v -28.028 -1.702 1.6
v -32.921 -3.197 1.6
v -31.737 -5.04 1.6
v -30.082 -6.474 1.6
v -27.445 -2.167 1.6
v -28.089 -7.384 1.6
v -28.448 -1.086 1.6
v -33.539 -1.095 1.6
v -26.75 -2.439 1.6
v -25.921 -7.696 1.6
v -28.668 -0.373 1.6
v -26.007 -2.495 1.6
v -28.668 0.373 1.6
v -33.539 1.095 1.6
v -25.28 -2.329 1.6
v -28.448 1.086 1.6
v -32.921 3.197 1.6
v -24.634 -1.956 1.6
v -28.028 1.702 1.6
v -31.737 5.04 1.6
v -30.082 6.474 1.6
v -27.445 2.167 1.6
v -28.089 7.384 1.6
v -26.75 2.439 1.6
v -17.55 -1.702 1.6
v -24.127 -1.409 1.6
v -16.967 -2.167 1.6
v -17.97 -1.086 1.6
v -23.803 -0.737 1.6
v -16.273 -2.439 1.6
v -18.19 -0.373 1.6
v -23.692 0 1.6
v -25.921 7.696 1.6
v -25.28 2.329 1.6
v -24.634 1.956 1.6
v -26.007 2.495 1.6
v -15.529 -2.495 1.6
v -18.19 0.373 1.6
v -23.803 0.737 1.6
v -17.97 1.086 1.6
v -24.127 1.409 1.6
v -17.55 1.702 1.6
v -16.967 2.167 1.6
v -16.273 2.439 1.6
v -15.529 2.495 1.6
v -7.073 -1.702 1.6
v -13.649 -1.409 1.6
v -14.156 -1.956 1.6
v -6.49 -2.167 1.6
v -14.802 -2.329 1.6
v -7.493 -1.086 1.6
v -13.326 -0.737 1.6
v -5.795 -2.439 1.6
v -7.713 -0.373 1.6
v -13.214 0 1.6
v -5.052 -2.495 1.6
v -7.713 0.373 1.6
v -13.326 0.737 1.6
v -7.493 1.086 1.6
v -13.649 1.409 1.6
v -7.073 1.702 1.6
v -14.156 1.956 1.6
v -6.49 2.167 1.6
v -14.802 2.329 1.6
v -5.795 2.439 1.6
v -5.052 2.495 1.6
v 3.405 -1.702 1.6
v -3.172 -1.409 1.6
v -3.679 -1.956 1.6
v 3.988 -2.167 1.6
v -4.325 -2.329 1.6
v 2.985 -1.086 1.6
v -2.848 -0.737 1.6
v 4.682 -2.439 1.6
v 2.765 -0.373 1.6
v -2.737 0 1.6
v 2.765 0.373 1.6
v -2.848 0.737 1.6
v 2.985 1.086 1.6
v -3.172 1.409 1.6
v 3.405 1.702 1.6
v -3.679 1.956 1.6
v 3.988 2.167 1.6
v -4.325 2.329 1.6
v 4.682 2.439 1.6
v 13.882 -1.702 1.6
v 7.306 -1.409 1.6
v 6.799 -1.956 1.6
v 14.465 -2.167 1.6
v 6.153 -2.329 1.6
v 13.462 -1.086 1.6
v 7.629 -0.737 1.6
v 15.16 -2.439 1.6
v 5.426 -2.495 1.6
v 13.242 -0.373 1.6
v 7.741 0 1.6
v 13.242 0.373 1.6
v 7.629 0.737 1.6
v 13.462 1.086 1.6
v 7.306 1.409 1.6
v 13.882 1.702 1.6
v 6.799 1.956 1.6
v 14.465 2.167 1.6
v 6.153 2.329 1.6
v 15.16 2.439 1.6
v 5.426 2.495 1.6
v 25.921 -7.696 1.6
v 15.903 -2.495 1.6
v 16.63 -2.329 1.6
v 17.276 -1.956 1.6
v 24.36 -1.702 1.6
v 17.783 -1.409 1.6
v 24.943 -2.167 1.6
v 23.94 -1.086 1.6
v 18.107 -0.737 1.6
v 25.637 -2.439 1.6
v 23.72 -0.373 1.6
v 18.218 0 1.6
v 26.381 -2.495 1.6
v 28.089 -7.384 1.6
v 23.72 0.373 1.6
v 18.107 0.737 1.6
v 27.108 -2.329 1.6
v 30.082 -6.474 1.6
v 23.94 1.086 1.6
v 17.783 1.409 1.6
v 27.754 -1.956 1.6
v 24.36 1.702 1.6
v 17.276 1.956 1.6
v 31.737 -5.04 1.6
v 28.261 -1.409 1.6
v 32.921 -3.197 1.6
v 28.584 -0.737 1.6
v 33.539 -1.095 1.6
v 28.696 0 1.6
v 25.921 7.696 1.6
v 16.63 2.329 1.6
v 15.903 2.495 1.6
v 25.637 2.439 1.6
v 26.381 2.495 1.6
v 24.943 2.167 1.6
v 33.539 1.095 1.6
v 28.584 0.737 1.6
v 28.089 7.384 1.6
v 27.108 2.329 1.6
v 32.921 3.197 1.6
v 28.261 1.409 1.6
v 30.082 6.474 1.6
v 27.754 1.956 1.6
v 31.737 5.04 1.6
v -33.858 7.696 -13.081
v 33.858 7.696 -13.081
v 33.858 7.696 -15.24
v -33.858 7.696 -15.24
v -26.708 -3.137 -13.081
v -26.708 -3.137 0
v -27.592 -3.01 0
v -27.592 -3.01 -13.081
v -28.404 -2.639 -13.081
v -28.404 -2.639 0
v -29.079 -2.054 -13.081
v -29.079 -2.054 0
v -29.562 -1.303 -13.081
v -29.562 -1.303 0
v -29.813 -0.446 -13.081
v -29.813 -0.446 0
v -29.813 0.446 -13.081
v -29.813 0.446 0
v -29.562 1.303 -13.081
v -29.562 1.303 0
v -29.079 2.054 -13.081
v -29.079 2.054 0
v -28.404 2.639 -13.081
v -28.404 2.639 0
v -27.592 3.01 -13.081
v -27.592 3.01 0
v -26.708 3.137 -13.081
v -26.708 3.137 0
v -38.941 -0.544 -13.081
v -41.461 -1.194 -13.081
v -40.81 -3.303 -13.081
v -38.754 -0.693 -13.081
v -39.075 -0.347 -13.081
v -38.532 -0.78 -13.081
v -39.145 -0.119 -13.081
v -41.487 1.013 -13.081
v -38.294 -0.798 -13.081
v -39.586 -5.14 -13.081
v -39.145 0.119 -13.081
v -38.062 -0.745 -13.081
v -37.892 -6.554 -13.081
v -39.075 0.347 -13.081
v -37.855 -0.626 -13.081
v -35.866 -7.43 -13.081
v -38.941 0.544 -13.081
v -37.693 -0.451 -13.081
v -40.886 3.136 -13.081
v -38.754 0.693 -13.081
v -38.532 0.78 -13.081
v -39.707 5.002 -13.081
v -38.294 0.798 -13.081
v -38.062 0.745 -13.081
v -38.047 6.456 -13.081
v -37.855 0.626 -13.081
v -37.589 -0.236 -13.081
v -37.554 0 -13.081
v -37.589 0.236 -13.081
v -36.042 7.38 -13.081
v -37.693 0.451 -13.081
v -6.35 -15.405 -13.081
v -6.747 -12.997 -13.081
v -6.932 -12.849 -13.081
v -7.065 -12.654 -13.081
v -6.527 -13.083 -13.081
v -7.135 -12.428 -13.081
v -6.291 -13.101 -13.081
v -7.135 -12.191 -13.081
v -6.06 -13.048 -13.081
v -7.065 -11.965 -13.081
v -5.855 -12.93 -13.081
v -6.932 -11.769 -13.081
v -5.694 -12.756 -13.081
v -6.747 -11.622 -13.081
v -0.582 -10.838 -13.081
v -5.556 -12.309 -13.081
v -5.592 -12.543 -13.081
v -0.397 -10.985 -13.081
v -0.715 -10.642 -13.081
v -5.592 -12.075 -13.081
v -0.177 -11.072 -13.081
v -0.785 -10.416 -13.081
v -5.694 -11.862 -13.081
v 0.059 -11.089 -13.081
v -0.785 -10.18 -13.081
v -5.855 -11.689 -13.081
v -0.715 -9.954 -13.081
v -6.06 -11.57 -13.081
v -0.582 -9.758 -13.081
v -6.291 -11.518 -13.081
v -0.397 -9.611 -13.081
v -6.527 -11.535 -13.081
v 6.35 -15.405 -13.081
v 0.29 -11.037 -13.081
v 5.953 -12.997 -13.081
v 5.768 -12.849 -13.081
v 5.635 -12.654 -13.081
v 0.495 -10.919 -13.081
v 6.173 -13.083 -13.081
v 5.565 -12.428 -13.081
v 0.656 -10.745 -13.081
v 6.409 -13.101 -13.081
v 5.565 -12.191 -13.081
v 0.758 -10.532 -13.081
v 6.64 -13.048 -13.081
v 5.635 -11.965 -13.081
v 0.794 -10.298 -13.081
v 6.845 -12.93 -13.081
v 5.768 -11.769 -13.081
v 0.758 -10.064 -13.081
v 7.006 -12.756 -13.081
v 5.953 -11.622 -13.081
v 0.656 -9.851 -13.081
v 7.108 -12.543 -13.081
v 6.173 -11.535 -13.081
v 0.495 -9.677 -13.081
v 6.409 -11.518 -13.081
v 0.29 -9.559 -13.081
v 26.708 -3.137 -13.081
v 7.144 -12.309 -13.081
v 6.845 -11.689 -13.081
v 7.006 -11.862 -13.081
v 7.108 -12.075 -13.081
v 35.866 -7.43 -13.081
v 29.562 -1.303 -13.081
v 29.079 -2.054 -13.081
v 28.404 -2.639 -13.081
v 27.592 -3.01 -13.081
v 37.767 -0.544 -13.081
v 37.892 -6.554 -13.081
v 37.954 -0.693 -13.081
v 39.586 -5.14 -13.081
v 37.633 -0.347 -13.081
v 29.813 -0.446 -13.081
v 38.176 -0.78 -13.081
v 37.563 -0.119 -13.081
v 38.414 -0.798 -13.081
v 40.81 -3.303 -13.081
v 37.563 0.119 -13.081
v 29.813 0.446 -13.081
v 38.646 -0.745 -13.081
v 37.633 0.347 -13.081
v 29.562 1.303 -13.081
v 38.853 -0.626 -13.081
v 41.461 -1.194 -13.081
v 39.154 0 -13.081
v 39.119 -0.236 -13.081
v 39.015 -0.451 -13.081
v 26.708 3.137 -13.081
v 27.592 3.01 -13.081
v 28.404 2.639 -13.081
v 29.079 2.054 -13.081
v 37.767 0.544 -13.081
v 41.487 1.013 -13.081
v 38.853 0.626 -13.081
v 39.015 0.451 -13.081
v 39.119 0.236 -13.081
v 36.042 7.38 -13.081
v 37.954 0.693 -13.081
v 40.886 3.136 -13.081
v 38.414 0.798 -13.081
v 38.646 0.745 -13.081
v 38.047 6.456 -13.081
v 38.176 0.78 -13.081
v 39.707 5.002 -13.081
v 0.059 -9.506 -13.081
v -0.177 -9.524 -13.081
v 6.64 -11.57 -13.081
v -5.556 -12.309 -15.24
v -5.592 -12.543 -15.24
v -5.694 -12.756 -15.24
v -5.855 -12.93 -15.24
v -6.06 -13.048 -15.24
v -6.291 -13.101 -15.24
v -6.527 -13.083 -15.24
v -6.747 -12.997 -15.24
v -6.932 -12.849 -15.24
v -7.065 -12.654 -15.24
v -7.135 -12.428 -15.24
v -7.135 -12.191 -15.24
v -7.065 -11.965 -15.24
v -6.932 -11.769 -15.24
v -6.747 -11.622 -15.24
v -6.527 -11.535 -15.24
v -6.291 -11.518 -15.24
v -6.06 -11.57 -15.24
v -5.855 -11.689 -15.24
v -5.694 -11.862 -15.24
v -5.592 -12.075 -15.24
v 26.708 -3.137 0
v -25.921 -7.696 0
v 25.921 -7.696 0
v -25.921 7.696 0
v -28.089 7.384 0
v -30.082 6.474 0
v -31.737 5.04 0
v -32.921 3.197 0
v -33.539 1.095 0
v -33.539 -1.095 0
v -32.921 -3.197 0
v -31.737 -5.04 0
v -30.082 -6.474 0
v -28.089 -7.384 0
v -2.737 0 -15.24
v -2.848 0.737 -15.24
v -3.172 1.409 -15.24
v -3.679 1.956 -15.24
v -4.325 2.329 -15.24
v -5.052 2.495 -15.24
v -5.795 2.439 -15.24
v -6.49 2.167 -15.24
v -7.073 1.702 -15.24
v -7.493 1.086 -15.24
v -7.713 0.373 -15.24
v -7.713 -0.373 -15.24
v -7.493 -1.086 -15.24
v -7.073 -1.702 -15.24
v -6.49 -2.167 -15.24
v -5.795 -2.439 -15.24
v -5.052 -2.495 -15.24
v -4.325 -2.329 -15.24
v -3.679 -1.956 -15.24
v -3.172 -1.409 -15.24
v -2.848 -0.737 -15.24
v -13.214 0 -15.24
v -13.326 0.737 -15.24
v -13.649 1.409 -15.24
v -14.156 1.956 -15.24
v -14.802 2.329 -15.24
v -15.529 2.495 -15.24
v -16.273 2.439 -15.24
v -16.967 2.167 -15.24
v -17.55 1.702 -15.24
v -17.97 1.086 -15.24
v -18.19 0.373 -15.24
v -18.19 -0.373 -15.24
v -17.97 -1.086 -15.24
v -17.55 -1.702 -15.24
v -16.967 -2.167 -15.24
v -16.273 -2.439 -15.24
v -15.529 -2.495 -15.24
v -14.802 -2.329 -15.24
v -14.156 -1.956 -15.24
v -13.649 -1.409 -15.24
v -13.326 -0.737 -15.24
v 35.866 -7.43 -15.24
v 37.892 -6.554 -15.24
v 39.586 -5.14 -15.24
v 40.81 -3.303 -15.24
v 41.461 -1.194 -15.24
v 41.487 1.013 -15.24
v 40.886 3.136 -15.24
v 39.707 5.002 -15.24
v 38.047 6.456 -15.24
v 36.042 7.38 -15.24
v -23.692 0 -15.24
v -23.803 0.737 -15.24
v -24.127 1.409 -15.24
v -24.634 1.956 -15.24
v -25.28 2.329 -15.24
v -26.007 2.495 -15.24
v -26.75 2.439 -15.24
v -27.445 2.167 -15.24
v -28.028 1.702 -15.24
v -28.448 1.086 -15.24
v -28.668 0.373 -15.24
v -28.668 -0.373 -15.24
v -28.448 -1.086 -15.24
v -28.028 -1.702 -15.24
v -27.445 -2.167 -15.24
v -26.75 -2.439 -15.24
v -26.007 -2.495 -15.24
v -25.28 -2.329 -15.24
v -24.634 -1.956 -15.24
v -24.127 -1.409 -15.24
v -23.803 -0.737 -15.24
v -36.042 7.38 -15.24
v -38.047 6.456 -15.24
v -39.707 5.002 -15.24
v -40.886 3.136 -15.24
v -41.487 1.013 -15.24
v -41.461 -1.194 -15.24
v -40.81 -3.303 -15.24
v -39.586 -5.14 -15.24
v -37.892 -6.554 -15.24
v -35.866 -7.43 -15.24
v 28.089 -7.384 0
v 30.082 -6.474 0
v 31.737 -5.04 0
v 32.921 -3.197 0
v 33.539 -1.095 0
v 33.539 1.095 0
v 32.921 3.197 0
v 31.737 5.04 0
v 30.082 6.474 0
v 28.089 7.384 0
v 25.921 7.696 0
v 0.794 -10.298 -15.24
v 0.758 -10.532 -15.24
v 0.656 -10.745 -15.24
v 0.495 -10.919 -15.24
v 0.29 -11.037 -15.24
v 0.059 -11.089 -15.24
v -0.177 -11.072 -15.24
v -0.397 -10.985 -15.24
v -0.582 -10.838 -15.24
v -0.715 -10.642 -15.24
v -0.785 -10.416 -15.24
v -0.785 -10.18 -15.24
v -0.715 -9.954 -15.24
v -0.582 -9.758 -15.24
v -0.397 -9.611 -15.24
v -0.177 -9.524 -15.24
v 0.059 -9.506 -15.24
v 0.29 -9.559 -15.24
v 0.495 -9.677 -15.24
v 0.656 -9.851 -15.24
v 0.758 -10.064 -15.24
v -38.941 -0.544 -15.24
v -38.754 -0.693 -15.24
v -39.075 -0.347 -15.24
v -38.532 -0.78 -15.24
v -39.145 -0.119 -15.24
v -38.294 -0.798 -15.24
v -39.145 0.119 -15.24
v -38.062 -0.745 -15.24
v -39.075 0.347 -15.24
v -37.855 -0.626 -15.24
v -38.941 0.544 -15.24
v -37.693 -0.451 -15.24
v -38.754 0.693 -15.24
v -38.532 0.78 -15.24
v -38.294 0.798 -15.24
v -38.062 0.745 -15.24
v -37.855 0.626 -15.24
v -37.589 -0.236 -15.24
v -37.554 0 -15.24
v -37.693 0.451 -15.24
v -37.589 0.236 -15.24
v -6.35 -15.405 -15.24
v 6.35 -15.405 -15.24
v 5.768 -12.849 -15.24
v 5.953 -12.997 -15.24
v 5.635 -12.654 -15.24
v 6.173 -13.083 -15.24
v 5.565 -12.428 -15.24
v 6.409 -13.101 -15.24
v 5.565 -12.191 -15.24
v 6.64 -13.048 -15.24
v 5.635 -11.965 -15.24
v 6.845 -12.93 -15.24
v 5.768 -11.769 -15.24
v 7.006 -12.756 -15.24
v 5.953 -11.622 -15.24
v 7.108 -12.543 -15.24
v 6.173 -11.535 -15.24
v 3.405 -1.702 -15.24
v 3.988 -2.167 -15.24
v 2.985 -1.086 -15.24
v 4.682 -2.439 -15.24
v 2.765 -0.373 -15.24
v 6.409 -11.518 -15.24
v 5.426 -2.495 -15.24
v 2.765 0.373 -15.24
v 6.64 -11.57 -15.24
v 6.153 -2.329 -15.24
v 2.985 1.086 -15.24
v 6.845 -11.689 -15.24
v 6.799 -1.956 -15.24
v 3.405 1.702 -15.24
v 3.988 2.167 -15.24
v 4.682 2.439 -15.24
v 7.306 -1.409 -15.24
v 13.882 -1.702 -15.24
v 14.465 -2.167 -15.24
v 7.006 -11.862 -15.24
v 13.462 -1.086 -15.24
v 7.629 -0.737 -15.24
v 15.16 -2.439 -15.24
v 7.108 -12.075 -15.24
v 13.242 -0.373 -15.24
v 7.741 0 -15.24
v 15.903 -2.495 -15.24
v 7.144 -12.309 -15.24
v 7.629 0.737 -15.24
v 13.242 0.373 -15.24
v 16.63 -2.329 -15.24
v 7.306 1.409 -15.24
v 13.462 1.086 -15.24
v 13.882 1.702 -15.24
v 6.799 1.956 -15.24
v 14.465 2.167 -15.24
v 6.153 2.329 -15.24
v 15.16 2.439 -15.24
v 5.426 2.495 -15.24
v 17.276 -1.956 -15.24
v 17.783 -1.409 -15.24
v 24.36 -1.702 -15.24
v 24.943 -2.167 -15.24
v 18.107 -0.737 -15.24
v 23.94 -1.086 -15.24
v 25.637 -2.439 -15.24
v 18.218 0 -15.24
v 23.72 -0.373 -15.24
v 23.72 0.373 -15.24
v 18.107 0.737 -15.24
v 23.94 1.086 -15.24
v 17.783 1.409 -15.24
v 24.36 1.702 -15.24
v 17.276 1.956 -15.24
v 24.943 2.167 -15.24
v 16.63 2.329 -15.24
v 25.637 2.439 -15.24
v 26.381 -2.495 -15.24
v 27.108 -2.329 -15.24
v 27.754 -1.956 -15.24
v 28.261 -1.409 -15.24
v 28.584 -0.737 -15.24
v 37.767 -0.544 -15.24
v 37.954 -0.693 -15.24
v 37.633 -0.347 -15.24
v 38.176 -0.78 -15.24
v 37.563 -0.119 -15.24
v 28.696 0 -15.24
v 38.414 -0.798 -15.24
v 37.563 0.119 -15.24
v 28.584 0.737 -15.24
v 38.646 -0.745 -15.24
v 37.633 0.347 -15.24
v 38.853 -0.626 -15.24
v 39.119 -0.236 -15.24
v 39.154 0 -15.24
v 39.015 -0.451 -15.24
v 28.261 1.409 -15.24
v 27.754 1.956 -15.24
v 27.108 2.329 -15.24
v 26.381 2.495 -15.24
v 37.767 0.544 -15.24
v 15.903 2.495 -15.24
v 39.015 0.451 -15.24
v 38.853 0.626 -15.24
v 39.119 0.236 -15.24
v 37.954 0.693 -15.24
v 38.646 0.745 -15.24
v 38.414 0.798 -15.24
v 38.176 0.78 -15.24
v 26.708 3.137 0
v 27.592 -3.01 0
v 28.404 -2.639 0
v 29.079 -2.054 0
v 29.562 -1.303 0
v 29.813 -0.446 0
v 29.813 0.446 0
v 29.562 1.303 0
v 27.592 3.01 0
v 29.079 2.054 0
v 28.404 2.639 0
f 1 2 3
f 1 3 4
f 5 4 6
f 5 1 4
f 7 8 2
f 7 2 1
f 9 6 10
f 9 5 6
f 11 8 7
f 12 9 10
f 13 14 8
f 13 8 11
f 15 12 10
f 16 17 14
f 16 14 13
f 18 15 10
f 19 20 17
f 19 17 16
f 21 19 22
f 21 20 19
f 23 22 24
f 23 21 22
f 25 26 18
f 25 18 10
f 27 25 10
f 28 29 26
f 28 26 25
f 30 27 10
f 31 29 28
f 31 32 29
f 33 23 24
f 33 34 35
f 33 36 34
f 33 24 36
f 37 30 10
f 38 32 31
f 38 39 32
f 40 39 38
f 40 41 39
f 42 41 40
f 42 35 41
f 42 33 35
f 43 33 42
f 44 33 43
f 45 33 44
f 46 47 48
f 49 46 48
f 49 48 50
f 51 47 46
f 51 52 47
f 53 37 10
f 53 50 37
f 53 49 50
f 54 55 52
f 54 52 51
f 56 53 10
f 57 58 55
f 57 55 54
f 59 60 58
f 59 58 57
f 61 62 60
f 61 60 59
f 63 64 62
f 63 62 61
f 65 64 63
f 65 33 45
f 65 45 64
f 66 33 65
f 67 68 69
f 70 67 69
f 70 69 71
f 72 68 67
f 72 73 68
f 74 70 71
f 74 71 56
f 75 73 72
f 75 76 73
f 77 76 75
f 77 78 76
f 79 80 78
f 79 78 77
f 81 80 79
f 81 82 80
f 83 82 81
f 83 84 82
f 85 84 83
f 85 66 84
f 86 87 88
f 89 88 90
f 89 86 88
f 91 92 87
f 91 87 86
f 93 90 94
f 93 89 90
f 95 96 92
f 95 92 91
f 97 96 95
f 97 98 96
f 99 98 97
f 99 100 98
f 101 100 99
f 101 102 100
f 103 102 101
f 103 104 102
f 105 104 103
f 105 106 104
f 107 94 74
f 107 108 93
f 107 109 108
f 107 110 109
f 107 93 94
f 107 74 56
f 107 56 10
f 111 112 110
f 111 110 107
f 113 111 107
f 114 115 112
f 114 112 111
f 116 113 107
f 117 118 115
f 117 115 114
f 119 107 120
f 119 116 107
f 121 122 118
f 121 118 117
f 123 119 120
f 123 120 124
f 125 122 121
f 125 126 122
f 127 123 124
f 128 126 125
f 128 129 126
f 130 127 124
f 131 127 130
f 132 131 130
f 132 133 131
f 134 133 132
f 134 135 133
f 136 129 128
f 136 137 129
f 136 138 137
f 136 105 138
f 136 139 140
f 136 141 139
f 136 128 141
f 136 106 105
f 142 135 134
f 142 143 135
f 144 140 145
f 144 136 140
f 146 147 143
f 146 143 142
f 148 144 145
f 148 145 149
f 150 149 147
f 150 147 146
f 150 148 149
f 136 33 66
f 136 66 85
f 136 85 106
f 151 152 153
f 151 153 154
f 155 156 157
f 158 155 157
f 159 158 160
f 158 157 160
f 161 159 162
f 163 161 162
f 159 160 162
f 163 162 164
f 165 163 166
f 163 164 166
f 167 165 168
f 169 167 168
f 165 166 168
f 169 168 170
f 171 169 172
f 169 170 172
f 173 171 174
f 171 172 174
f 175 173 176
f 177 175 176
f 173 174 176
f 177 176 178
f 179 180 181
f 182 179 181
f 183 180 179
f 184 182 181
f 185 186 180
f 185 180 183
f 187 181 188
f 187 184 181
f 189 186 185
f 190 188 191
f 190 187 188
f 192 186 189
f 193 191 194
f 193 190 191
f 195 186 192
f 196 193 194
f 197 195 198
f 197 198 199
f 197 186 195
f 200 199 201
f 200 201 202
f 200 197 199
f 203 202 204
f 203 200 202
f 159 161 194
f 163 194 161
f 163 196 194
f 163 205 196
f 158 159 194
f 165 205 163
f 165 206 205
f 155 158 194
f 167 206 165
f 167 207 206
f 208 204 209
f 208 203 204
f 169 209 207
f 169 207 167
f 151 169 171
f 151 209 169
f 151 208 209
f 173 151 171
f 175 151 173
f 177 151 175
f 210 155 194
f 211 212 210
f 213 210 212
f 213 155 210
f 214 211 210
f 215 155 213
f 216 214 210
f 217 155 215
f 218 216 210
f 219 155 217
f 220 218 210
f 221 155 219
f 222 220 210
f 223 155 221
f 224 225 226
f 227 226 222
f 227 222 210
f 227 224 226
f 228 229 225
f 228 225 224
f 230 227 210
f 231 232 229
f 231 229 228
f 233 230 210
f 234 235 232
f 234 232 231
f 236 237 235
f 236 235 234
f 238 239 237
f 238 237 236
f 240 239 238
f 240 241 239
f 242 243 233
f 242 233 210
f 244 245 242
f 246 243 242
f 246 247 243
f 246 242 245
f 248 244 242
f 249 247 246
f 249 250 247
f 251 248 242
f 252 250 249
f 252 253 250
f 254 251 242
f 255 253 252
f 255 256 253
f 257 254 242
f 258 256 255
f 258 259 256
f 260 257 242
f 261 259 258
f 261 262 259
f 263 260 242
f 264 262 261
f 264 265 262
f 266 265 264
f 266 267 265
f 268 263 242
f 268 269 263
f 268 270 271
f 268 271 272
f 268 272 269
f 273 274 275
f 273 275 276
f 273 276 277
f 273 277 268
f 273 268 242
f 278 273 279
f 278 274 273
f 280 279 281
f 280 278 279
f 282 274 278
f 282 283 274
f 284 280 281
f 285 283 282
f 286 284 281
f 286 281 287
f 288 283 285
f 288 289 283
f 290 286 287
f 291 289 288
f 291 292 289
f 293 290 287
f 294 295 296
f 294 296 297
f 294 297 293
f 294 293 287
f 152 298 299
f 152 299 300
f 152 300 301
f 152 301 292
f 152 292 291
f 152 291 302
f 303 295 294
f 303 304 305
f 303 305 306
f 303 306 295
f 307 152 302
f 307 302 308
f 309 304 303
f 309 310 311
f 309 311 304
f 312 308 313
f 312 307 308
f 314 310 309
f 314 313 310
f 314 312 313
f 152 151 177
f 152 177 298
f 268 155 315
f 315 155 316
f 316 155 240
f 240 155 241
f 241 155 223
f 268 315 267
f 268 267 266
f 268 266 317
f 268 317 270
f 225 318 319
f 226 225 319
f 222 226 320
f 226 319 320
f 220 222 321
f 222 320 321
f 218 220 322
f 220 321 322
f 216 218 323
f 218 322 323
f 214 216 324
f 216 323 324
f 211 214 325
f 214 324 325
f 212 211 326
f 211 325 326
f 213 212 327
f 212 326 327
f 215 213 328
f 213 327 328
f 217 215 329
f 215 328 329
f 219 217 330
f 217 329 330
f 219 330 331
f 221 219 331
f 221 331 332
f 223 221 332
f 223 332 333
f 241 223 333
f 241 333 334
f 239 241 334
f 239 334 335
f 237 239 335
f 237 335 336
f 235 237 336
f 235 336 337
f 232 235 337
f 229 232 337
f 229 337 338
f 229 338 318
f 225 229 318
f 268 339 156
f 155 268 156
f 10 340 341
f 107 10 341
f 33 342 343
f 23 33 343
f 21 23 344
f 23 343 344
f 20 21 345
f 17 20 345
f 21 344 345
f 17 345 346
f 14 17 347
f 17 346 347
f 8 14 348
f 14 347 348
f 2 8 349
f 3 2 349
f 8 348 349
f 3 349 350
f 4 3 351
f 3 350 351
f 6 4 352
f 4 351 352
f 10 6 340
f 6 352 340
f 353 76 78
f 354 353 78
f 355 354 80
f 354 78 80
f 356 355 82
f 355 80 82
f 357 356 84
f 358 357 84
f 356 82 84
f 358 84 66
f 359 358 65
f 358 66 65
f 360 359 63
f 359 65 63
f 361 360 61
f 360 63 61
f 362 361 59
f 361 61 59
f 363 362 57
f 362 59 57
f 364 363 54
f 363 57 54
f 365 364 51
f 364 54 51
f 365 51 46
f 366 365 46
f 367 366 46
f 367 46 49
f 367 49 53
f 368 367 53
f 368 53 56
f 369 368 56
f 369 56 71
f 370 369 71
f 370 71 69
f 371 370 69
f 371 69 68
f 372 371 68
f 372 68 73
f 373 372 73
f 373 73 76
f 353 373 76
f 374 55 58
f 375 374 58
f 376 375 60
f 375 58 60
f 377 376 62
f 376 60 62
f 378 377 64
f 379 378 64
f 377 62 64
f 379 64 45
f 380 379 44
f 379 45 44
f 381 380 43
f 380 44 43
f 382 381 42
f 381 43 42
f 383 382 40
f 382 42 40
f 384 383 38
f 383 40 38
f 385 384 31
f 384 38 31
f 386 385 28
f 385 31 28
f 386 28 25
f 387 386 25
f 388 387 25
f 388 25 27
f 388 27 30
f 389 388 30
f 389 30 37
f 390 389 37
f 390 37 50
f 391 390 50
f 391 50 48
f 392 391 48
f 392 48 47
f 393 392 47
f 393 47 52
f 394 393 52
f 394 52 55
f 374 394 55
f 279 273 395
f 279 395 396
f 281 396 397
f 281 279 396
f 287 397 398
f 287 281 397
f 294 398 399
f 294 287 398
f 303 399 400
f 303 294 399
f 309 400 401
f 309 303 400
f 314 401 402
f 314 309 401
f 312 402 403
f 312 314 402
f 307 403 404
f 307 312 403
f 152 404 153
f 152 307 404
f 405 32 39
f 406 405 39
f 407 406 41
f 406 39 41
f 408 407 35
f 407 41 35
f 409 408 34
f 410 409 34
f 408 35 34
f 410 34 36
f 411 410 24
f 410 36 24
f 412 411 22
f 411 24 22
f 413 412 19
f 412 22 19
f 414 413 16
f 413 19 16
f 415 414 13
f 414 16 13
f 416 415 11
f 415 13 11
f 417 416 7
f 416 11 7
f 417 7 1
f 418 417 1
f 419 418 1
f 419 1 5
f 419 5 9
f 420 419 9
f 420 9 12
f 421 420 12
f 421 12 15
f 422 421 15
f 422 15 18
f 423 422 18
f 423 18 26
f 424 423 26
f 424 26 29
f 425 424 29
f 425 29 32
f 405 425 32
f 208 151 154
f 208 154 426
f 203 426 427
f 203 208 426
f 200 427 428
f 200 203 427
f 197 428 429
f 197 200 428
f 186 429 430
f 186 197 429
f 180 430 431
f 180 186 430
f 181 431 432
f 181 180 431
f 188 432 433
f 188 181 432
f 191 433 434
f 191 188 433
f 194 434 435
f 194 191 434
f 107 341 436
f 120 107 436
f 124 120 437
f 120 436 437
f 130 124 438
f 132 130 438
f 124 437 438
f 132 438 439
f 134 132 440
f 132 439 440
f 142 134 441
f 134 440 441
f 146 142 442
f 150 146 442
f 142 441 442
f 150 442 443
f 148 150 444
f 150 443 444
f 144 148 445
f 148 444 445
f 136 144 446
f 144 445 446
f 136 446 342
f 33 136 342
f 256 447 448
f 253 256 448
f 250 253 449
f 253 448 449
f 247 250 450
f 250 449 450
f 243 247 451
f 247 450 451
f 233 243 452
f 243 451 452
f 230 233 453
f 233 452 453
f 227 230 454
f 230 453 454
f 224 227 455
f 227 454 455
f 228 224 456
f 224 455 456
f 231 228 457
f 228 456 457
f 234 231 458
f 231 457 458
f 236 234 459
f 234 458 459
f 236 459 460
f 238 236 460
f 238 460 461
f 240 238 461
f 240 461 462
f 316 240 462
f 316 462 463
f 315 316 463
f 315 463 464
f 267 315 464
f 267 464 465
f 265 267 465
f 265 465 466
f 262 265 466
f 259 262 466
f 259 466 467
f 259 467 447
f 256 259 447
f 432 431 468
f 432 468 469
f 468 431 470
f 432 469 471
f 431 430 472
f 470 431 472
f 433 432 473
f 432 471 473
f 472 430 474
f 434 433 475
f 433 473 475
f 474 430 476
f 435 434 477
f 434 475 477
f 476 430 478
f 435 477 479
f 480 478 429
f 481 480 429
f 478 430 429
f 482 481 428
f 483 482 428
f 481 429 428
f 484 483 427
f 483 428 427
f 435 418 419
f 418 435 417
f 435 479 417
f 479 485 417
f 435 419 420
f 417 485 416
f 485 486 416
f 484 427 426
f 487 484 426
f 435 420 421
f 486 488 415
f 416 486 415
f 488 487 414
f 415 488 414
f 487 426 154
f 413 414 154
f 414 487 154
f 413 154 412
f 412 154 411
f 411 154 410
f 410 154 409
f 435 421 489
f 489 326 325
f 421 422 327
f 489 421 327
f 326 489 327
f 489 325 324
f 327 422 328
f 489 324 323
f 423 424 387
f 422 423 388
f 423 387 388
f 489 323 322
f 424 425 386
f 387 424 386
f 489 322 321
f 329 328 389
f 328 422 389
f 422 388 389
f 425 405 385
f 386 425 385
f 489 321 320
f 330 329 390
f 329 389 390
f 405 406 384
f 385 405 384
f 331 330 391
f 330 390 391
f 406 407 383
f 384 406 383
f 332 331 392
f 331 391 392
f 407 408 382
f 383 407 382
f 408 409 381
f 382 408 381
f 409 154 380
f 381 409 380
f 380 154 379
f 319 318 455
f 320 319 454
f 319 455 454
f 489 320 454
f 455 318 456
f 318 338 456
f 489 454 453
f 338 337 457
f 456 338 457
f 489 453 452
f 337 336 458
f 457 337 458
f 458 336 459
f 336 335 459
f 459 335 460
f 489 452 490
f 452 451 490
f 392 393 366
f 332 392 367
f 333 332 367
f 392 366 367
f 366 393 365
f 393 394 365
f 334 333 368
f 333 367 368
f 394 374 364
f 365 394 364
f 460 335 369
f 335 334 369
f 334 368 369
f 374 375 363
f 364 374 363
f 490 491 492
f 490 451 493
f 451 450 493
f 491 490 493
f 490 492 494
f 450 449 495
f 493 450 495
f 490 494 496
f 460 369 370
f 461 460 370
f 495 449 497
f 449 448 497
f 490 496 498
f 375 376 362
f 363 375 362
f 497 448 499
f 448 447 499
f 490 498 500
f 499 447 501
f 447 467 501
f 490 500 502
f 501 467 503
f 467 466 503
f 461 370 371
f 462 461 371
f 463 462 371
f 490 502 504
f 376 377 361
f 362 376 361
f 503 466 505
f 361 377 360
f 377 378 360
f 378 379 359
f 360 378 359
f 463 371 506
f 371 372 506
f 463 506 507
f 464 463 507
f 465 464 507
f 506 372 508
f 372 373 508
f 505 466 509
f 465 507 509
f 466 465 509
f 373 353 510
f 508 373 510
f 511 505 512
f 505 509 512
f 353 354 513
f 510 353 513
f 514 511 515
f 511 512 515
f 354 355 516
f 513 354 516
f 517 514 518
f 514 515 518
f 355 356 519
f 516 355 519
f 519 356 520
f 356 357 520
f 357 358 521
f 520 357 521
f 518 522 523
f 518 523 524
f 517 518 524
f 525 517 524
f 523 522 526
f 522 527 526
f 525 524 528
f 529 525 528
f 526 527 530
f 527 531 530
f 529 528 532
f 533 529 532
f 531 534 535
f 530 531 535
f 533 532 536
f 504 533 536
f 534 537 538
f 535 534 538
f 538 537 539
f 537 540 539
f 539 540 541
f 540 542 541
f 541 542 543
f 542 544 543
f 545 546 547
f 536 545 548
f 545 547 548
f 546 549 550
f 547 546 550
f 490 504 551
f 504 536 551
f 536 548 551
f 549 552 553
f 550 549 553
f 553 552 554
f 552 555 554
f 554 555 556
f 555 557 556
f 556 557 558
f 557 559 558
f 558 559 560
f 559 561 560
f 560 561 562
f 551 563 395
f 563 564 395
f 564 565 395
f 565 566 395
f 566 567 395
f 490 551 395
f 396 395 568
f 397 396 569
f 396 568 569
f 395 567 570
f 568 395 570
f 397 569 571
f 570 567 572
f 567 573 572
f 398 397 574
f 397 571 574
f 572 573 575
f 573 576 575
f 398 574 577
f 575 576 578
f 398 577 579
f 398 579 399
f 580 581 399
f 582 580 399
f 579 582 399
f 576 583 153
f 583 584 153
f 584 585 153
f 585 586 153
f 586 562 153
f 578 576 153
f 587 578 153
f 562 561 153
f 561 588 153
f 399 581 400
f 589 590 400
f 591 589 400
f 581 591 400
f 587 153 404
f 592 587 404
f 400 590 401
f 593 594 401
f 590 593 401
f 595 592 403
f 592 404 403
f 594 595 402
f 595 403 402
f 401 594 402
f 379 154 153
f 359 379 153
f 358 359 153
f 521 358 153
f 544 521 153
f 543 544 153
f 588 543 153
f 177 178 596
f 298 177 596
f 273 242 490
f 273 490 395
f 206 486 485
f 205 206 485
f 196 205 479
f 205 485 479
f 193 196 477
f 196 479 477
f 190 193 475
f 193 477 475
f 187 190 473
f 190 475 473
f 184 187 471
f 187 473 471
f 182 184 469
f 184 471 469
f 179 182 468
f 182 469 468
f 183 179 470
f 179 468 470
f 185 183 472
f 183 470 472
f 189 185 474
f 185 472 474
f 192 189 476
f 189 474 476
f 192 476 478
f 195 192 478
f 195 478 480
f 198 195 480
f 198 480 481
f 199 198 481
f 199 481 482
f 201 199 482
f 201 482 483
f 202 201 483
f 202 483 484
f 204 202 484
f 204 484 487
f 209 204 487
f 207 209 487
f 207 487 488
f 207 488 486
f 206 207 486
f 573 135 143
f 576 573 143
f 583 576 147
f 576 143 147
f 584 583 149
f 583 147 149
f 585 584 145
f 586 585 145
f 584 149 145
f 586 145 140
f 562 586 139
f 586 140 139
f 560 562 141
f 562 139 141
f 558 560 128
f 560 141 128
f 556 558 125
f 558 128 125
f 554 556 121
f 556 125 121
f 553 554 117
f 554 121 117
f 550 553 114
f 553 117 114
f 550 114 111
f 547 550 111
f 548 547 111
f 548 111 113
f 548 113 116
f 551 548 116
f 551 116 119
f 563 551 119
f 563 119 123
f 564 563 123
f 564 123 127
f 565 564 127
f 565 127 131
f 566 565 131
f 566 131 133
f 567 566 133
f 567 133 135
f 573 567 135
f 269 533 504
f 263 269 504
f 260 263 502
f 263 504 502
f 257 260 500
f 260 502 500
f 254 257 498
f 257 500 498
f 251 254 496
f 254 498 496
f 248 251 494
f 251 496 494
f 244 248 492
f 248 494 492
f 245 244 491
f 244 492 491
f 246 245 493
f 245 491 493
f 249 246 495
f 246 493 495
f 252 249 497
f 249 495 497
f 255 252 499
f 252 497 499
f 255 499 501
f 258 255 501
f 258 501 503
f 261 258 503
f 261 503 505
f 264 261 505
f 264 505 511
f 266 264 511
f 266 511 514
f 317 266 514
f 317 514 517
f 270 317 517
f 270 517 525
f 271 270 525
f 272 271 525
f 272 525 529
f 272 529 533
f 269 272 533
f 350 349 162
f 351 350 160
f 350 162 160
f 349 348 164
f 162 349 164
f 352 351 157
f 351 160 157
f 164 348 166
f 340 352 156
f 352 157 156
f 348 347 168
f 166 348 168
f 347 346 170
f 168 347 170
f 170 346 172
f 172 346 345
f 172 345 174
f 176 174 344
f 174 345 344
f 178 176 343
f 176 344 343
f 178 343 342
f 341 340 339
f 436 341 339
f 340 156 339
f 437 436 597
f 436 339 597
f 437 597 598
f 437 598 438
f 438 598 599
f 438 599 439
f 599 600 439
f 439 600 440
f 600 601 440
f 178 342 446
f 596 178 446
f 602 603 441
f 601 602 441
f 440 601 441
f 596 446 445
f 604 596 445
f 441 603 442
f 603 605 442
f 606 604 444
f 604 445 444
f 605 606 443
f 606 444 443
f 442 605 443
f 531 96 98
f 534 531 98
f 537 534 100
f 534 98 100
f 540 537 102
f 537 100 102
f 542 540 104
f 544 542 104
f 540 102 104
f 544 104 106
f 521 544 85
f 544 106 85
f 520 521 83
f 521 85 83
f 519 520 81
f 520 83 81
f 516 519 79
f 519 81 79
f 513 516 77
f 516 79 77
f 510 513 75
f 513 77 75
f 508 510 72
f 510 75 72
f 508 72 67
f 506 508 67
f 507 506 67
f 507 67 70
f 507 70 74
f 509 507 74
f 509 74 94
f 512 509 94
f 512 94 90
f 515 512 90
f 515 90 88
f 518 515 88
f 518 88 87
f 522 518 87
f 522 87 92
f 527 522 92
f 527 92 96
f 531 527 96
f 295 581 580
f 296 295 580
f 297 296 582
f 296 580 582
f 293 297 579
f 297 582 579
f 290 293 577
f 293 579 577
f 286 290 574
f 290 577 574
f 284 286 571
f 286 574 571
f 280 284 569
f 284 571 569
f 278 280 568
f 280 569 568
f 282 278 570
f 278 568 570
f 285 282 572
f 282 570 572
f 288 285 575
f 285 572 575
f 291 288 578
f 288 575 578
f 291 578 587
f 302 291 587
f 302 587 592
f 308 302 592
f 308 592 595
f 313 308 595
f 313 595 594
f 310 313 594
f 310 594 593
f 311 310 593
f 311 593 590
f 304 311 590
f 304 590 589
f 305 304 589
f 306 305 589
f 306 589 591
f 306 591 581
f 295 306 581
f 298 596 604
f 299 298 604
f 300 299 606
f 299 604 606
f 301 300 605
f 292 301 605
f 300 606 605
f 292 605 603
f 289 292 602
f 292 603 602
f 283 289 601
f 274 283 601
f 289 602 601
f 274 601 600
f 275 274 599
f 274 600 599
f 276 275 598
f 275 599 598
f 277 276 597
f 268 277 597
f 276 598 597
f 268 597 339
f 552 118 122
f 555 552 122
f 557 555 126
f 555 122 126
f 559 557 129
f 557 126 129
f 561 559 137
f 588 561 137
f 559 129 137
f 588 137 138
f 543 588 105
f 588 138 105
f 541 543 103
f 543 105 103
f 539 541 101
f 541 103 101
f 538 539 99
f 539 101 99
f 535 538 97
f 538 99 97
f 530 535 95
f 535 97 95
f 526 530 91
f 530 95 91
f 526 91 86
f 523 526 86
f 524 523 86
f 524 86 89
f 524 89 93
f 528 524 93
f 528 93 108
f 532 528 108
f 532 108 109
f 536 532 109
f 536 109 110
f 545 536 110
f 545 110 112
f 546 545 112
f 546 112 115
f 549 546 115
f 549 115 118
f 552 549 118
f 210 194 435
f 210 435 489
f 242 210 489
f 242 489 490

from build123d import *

# Parameters (mm, degrees)
F1_DEPTH  = 1.6002
F4_DEPTH  = 2.159
F6_DEPTH  = 13.081
F7_R      = 2.5019
F8_DEPTH  = 16.8412
F9_R      = 0.8001
F9_R_2    = 0.79375
F10_DEPTH = 16.8412


with BuildPart() as f1:
    # F0 (on Top) → F1 (new body)
    with BuildSketch(Plane.XY):
        with BuildLine():
            Line((1.433722, 7.6962), (-1.433722, 7.6962))
            Line((-1.433722, 7.6962), (-25.9207, 7.6962))
            ThreePointArc((-25.9207, 7.6962), (-33.6169, 0), (-25.9207, -7.6962))
            Line((-25.9207, -7.6962), (-1.433722, -7.6962))
            Line((-1.433722, -7.6962), (1.433722, -7.6962))
            Line((1.433722, -7.6962), (25.9207, -7.6962))
            ThreePointArc((25.9207, -7.6962), (33.6169, 0), (25.9207, 7.6962))
            Line((25.9207, 7.6962), (1.433722, 7.6962))
        make_face()
    extrude(amount=F1_DEPTH)



with BuildPart() as f4:
    # F3 (on offset) → F4 (new body)
    with BuildSketch(Plane.XY.offset(-13.081)):
        with BuildLine():
            Line((-35.865766, -7.429749), (-6.35, -15.4051))
            Line((-6.35, -15.4051), (6.35, -15.4051))
            Line((6.35, -15.4051), (35.865766, -7.429749))
            ThreePointArc((35.865766, -7.429749), (41.487496, 1.012586), (33.8582, 7.6962))
            Line((33.8582, 7.6962), (0, 7.6962))
            Line((0, 7.6962), (-33.8582, 7.6962))
            ThreePointArc((-33.8582, 7.6962), (-41.487496, 1.012586), (-35.865766, -7.429749))
        make_face()
    extrude(amount=-F4_DEPTH)


with BuildPart() as f1_1:
    add(f1.part)

    add(f4.part)  # F6 merges F4
    # F5 (on face) → F6 (join, through all)
    with BuildSketch(Plane(origin=(0, 0, 0), x_dir=(1, 0, 0), z_dir=(0, 0, -1))):
        with BuildLine():
            Line((0, -3.1369), (26.7081, -3.1369))
            ThreePointArc((26.7081, -3.1369), (29.845, 0), (26.7081, 3.1369))
            Line((26.7081, 3.1369), (0, 3.1369))
            Line((0, 3.1369), (-26.7081, 3.1369))
            ThreePointArc((-26.7081, 3.1369), (-29.845, 0), (-26.7081, -3.1369))
            Line((-26.7081, -3.1369), (0, -3.1369))
        make_face()
    extrude(amount=F6_DEPTH)

    # F7 (on face) → F8 (cut, through all)
    with BuildSketch(Plane.XY.offset(1.6002)):
        with Locations((-5.23875, 0)):
            Circle(F7_R)
        with Locations((-15.71625, 0)):
            Circle(F7_R)
        with Locations((-26.19375, 0)):
            Circle(F7_R)
        with Locations((5.23875, 0)):
            Circle(F7_R)
        with Locations((15.71625, 0)):
            Circle(F7_R)
        with Locations((26.19375, 0)):
            Circle(F7_R)
    extrude(amount=-F8_DEPTH, mode=Mode.SUBTRACT)

    # F9 (on face) → F10 (cut, through all)
    with BuildSketch(Plane(origin=(0, 0, -15.24), x_dir=(1, 0, 0), z_dir=(0, 0, -1))):
        with Locations((38.354, 0)):
            Circle(F9_R)
        with Locations((-38.354, 0)):
            Circle(F9_R)
        with Locations((-6.35, 12.309221)):
            Circle(F9_R_2)
        with Locations((0, 10.297953)):
            Circle(F9_R_2)
        with Locations((6.35, 12.309221)):
            Circle(F9_R_2)
    extrude(amount=-F10_DEPTH, mode=Mode.SUBTRACT)


solid = f1_1.part
